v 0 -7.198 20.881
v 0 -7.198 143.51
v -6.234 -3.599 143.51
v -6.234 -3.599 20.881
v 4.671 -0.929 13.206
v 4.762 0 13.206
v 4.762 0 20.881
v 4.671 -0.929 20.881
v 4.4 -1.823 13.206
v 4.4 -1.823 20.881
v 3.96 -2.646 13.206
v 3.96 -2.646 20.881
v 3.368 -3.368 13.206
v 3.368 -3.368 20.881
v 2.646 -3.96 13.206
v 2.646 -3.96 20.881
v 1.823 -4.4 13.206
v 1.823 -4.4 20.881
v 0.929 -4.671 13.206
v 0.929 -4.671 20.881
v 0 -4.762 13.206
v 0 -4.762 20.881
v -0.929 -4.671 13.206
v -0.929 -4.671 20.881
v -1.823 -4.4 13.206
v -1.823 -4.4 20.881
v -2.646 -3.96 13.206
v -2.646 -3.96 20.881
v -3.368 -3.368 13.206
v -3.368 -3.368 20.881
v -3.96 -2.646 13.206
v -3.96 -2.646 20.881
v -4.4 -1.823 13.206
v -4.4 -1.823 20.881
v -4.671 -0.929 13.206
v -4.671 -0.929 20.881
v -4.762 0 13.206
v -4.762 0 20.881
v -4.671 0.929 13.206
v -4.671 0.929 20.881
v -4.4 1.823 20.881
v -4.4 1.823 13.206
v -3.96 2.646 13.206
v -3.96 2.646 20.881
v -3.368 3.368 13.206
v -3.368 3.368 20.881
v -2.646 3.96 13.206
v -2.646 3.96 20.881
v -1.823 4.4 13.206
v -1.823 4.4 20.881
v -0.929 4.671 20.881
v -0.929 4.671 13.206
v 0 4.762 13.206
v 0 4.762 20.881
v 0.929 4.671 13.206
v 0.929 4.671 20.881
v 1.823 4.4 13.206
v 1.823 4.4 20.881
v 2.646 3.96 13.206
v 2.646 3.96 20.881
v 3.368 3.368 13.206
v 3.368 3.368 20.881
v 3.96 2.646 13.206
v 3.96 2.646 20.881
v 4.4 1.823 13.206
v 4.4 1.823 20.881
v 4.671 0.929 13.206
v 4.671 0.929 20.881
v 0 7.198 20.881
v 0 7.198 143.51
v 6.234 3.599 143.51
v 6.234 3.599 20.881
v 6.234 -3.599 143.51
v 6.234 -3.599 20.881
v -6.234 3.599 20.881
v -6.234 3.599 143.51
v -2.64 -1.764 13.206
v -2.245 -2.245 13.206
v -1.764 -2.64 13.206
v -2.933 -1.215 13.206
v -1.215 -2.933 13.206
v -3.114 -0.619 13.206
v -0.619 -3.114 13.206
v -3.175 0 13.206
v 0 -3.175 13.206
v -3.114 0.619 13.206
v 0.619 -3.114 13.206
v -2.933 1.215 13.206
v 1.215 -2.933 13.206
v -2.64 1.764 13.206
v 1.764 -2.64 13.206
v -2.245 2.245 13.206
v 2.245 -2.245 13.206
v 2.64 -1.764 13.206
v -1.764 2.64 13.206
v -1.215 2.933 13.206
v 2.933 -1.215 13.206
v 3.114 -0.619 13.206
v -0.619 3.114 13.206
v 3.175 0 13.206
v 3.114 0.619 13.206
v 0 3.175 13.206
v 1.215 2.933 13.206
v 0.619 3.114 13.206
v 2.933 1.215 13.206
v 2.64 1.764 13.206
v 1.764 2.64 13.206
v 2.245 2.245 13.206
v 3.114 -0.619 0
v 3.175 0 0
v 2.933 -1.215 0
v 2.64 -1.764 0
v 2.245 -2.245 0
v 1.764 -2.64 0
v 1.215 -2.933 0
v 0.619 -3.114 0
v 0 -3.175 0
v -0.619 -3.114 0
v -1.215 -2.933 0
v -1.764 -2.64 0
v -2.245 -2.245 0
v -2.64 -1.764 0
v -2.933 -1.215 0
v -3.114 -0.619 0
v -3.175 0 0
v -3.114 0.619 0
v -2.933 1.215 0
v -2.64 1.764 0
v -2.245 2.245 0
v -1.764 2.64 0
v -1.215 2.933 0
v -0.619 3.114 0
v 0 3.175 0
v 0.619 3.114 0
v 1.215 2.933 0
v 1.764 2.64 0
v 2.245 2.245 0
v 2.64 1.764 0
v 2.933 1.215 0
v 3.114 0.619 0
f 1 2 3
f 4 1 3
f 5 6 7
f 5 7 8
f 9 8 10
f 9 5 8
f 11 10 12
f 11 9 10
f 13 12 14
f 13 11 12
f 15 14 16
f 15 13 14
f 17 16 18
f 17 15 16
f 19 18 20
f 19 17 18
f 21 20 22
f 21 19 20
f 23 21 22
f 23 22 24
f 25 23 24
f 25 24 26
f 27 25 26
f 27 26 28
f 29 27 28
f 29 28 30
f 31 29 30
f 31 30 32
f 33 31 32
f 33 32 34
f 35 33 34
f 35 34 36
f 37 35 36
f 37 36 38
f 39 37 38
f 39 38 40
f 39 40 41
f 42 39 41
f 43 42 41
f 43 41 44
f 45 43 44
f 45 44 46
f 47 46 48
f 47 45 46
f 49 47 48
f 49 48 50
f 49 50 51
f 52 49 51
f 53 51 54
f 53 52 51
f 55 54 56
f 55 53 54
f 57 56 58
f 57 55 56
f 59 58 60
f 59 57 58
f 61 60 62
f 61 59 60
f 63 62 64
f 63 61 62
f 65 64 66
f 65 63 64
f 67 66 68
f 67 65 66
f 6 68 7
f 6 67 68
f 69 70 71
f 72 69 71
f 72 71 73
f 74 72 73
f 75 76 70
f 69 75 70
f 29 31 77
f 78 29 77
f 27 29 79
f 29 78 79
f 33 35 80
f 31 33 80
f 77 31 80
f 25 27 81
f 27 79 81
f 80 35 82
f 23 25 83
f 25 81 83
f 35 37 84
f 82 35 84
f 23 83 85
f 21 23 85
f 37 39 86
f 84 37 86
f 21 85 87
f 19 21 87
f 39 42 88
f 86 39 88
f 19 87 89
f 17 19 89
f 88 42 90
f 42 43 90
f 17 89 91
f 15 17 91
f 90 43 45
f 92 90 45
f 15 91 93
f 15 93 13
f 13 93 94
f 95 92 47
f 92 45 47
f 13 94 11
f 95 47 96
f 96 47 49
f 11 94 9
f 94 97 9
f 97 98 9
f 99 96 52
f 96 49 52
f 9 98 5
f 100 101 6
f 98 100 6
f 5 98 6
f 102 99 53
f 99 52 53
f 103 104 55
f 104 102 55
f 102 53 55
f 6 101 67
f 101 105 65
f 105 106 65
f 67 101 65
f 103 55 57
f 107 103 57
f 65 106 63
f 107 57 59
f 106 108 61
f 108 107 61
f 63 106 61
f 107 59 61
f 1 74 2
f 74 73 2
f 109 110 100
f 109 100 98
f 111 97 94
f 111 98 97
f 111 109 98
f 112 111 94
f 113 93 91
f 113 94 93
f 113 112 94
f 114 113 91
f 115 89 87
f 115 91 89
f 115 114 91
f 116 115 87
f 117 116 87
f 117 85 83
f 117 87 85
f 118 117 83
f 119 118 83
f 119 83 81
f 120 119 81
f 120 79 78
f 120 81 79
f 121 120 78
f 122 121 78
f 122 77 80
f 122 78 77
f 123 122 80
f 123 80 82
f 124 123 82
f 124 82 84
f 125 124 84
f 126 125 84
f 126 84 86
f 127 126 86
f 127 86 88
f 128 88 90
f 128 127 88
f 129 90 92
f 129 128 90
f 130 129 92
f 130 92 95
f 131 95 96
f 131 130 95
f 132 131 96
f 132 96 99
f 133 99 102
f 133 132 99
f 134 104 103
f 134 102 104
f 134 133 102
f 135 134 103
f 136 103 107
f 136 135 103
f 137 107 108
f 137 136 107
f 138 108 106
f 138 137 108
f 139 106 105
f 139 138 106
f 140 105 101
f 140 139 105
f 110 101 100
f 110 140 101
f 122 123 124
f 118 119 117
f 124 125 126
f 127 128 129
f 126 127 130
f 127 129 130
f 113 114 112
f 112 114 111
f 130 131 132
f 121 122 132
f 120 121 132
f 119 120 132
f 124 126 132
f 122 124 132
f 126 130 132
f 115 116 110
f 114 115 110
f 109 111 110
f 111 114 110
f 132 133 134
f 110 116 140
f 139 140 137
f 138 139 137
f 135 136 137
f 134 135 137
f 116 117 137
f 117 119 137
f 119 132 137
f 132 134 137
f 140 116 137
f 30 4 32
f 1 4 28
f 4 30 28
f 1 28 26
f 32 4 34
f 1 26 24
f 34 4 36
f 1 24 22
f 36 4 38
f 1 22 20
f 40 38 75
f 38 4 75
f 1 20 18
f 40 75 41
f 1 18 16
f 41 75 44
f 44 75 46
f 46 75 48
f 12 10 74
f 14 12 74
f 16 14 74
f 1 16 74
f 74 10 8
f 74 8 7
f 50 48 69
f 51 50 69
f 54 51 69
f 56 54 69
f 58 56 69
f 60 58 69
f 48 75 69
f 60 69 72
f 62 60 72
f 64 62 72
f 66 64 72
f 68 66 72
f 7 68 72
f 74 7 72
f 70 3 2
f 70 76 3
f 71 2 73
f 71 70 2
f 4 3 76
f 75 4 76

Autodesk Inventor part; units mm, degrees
ref_plane "YZ Plane" through (0, 0, 0) normal (1, 0, 0) x (0, 1, 0)
ref_plane "XZ Plane" through (0, 0, 0) normal (0, 1, 0) x (-1, 0, 0)
ref_plane "XY Plane" through (0, 0, 0) normal (0, 0, 1) x (1, 0, 0)
sketch "Sketch3" plane through (0, 0, 0) normal (0, 0, 1) x (1, 0, 0)
  circle A0 centre (0, 0) radius 4.7625
  circle A1 centre (0, 0) radius 3.175
  dimension "d4" = 9.525
  dimension "d5" = 6.35
extrude "Extrusion2" add sketch "Sketch3" along normal blind 143.51 contours A0 | A1
extrude "Extrusion3" cut sketch "Sketch3" along normal blind 13.2055
sketch "Sketch4" plane through (0, 0, 143.51) normal (0, 0, 1) x (1, 0, 0)
  circle A0 centre (0, 0) radius 3.175 projected
  line L0 (0, -7.1984) -> (-6.234, -3.5992)
  line L1 (-6.234, -3.5992) -> (-6.234, 3.5992)
  line L2 (-6.234, 3.5992) -> (0, 7.1984)
  line L3 (0, 7.1984) -> (6.234, 3.5992)
  line L4 (6.234, 3.5992) -> (6.234, -3.5992)
  line L5 (6.234, -3.5992) -> (0, -7.1984)
  dimension "d10" = 14.3967
extrude "Extrusion4" add sketch "Sketch4" against normal blind 122.6287
properties part number "hex rod"
